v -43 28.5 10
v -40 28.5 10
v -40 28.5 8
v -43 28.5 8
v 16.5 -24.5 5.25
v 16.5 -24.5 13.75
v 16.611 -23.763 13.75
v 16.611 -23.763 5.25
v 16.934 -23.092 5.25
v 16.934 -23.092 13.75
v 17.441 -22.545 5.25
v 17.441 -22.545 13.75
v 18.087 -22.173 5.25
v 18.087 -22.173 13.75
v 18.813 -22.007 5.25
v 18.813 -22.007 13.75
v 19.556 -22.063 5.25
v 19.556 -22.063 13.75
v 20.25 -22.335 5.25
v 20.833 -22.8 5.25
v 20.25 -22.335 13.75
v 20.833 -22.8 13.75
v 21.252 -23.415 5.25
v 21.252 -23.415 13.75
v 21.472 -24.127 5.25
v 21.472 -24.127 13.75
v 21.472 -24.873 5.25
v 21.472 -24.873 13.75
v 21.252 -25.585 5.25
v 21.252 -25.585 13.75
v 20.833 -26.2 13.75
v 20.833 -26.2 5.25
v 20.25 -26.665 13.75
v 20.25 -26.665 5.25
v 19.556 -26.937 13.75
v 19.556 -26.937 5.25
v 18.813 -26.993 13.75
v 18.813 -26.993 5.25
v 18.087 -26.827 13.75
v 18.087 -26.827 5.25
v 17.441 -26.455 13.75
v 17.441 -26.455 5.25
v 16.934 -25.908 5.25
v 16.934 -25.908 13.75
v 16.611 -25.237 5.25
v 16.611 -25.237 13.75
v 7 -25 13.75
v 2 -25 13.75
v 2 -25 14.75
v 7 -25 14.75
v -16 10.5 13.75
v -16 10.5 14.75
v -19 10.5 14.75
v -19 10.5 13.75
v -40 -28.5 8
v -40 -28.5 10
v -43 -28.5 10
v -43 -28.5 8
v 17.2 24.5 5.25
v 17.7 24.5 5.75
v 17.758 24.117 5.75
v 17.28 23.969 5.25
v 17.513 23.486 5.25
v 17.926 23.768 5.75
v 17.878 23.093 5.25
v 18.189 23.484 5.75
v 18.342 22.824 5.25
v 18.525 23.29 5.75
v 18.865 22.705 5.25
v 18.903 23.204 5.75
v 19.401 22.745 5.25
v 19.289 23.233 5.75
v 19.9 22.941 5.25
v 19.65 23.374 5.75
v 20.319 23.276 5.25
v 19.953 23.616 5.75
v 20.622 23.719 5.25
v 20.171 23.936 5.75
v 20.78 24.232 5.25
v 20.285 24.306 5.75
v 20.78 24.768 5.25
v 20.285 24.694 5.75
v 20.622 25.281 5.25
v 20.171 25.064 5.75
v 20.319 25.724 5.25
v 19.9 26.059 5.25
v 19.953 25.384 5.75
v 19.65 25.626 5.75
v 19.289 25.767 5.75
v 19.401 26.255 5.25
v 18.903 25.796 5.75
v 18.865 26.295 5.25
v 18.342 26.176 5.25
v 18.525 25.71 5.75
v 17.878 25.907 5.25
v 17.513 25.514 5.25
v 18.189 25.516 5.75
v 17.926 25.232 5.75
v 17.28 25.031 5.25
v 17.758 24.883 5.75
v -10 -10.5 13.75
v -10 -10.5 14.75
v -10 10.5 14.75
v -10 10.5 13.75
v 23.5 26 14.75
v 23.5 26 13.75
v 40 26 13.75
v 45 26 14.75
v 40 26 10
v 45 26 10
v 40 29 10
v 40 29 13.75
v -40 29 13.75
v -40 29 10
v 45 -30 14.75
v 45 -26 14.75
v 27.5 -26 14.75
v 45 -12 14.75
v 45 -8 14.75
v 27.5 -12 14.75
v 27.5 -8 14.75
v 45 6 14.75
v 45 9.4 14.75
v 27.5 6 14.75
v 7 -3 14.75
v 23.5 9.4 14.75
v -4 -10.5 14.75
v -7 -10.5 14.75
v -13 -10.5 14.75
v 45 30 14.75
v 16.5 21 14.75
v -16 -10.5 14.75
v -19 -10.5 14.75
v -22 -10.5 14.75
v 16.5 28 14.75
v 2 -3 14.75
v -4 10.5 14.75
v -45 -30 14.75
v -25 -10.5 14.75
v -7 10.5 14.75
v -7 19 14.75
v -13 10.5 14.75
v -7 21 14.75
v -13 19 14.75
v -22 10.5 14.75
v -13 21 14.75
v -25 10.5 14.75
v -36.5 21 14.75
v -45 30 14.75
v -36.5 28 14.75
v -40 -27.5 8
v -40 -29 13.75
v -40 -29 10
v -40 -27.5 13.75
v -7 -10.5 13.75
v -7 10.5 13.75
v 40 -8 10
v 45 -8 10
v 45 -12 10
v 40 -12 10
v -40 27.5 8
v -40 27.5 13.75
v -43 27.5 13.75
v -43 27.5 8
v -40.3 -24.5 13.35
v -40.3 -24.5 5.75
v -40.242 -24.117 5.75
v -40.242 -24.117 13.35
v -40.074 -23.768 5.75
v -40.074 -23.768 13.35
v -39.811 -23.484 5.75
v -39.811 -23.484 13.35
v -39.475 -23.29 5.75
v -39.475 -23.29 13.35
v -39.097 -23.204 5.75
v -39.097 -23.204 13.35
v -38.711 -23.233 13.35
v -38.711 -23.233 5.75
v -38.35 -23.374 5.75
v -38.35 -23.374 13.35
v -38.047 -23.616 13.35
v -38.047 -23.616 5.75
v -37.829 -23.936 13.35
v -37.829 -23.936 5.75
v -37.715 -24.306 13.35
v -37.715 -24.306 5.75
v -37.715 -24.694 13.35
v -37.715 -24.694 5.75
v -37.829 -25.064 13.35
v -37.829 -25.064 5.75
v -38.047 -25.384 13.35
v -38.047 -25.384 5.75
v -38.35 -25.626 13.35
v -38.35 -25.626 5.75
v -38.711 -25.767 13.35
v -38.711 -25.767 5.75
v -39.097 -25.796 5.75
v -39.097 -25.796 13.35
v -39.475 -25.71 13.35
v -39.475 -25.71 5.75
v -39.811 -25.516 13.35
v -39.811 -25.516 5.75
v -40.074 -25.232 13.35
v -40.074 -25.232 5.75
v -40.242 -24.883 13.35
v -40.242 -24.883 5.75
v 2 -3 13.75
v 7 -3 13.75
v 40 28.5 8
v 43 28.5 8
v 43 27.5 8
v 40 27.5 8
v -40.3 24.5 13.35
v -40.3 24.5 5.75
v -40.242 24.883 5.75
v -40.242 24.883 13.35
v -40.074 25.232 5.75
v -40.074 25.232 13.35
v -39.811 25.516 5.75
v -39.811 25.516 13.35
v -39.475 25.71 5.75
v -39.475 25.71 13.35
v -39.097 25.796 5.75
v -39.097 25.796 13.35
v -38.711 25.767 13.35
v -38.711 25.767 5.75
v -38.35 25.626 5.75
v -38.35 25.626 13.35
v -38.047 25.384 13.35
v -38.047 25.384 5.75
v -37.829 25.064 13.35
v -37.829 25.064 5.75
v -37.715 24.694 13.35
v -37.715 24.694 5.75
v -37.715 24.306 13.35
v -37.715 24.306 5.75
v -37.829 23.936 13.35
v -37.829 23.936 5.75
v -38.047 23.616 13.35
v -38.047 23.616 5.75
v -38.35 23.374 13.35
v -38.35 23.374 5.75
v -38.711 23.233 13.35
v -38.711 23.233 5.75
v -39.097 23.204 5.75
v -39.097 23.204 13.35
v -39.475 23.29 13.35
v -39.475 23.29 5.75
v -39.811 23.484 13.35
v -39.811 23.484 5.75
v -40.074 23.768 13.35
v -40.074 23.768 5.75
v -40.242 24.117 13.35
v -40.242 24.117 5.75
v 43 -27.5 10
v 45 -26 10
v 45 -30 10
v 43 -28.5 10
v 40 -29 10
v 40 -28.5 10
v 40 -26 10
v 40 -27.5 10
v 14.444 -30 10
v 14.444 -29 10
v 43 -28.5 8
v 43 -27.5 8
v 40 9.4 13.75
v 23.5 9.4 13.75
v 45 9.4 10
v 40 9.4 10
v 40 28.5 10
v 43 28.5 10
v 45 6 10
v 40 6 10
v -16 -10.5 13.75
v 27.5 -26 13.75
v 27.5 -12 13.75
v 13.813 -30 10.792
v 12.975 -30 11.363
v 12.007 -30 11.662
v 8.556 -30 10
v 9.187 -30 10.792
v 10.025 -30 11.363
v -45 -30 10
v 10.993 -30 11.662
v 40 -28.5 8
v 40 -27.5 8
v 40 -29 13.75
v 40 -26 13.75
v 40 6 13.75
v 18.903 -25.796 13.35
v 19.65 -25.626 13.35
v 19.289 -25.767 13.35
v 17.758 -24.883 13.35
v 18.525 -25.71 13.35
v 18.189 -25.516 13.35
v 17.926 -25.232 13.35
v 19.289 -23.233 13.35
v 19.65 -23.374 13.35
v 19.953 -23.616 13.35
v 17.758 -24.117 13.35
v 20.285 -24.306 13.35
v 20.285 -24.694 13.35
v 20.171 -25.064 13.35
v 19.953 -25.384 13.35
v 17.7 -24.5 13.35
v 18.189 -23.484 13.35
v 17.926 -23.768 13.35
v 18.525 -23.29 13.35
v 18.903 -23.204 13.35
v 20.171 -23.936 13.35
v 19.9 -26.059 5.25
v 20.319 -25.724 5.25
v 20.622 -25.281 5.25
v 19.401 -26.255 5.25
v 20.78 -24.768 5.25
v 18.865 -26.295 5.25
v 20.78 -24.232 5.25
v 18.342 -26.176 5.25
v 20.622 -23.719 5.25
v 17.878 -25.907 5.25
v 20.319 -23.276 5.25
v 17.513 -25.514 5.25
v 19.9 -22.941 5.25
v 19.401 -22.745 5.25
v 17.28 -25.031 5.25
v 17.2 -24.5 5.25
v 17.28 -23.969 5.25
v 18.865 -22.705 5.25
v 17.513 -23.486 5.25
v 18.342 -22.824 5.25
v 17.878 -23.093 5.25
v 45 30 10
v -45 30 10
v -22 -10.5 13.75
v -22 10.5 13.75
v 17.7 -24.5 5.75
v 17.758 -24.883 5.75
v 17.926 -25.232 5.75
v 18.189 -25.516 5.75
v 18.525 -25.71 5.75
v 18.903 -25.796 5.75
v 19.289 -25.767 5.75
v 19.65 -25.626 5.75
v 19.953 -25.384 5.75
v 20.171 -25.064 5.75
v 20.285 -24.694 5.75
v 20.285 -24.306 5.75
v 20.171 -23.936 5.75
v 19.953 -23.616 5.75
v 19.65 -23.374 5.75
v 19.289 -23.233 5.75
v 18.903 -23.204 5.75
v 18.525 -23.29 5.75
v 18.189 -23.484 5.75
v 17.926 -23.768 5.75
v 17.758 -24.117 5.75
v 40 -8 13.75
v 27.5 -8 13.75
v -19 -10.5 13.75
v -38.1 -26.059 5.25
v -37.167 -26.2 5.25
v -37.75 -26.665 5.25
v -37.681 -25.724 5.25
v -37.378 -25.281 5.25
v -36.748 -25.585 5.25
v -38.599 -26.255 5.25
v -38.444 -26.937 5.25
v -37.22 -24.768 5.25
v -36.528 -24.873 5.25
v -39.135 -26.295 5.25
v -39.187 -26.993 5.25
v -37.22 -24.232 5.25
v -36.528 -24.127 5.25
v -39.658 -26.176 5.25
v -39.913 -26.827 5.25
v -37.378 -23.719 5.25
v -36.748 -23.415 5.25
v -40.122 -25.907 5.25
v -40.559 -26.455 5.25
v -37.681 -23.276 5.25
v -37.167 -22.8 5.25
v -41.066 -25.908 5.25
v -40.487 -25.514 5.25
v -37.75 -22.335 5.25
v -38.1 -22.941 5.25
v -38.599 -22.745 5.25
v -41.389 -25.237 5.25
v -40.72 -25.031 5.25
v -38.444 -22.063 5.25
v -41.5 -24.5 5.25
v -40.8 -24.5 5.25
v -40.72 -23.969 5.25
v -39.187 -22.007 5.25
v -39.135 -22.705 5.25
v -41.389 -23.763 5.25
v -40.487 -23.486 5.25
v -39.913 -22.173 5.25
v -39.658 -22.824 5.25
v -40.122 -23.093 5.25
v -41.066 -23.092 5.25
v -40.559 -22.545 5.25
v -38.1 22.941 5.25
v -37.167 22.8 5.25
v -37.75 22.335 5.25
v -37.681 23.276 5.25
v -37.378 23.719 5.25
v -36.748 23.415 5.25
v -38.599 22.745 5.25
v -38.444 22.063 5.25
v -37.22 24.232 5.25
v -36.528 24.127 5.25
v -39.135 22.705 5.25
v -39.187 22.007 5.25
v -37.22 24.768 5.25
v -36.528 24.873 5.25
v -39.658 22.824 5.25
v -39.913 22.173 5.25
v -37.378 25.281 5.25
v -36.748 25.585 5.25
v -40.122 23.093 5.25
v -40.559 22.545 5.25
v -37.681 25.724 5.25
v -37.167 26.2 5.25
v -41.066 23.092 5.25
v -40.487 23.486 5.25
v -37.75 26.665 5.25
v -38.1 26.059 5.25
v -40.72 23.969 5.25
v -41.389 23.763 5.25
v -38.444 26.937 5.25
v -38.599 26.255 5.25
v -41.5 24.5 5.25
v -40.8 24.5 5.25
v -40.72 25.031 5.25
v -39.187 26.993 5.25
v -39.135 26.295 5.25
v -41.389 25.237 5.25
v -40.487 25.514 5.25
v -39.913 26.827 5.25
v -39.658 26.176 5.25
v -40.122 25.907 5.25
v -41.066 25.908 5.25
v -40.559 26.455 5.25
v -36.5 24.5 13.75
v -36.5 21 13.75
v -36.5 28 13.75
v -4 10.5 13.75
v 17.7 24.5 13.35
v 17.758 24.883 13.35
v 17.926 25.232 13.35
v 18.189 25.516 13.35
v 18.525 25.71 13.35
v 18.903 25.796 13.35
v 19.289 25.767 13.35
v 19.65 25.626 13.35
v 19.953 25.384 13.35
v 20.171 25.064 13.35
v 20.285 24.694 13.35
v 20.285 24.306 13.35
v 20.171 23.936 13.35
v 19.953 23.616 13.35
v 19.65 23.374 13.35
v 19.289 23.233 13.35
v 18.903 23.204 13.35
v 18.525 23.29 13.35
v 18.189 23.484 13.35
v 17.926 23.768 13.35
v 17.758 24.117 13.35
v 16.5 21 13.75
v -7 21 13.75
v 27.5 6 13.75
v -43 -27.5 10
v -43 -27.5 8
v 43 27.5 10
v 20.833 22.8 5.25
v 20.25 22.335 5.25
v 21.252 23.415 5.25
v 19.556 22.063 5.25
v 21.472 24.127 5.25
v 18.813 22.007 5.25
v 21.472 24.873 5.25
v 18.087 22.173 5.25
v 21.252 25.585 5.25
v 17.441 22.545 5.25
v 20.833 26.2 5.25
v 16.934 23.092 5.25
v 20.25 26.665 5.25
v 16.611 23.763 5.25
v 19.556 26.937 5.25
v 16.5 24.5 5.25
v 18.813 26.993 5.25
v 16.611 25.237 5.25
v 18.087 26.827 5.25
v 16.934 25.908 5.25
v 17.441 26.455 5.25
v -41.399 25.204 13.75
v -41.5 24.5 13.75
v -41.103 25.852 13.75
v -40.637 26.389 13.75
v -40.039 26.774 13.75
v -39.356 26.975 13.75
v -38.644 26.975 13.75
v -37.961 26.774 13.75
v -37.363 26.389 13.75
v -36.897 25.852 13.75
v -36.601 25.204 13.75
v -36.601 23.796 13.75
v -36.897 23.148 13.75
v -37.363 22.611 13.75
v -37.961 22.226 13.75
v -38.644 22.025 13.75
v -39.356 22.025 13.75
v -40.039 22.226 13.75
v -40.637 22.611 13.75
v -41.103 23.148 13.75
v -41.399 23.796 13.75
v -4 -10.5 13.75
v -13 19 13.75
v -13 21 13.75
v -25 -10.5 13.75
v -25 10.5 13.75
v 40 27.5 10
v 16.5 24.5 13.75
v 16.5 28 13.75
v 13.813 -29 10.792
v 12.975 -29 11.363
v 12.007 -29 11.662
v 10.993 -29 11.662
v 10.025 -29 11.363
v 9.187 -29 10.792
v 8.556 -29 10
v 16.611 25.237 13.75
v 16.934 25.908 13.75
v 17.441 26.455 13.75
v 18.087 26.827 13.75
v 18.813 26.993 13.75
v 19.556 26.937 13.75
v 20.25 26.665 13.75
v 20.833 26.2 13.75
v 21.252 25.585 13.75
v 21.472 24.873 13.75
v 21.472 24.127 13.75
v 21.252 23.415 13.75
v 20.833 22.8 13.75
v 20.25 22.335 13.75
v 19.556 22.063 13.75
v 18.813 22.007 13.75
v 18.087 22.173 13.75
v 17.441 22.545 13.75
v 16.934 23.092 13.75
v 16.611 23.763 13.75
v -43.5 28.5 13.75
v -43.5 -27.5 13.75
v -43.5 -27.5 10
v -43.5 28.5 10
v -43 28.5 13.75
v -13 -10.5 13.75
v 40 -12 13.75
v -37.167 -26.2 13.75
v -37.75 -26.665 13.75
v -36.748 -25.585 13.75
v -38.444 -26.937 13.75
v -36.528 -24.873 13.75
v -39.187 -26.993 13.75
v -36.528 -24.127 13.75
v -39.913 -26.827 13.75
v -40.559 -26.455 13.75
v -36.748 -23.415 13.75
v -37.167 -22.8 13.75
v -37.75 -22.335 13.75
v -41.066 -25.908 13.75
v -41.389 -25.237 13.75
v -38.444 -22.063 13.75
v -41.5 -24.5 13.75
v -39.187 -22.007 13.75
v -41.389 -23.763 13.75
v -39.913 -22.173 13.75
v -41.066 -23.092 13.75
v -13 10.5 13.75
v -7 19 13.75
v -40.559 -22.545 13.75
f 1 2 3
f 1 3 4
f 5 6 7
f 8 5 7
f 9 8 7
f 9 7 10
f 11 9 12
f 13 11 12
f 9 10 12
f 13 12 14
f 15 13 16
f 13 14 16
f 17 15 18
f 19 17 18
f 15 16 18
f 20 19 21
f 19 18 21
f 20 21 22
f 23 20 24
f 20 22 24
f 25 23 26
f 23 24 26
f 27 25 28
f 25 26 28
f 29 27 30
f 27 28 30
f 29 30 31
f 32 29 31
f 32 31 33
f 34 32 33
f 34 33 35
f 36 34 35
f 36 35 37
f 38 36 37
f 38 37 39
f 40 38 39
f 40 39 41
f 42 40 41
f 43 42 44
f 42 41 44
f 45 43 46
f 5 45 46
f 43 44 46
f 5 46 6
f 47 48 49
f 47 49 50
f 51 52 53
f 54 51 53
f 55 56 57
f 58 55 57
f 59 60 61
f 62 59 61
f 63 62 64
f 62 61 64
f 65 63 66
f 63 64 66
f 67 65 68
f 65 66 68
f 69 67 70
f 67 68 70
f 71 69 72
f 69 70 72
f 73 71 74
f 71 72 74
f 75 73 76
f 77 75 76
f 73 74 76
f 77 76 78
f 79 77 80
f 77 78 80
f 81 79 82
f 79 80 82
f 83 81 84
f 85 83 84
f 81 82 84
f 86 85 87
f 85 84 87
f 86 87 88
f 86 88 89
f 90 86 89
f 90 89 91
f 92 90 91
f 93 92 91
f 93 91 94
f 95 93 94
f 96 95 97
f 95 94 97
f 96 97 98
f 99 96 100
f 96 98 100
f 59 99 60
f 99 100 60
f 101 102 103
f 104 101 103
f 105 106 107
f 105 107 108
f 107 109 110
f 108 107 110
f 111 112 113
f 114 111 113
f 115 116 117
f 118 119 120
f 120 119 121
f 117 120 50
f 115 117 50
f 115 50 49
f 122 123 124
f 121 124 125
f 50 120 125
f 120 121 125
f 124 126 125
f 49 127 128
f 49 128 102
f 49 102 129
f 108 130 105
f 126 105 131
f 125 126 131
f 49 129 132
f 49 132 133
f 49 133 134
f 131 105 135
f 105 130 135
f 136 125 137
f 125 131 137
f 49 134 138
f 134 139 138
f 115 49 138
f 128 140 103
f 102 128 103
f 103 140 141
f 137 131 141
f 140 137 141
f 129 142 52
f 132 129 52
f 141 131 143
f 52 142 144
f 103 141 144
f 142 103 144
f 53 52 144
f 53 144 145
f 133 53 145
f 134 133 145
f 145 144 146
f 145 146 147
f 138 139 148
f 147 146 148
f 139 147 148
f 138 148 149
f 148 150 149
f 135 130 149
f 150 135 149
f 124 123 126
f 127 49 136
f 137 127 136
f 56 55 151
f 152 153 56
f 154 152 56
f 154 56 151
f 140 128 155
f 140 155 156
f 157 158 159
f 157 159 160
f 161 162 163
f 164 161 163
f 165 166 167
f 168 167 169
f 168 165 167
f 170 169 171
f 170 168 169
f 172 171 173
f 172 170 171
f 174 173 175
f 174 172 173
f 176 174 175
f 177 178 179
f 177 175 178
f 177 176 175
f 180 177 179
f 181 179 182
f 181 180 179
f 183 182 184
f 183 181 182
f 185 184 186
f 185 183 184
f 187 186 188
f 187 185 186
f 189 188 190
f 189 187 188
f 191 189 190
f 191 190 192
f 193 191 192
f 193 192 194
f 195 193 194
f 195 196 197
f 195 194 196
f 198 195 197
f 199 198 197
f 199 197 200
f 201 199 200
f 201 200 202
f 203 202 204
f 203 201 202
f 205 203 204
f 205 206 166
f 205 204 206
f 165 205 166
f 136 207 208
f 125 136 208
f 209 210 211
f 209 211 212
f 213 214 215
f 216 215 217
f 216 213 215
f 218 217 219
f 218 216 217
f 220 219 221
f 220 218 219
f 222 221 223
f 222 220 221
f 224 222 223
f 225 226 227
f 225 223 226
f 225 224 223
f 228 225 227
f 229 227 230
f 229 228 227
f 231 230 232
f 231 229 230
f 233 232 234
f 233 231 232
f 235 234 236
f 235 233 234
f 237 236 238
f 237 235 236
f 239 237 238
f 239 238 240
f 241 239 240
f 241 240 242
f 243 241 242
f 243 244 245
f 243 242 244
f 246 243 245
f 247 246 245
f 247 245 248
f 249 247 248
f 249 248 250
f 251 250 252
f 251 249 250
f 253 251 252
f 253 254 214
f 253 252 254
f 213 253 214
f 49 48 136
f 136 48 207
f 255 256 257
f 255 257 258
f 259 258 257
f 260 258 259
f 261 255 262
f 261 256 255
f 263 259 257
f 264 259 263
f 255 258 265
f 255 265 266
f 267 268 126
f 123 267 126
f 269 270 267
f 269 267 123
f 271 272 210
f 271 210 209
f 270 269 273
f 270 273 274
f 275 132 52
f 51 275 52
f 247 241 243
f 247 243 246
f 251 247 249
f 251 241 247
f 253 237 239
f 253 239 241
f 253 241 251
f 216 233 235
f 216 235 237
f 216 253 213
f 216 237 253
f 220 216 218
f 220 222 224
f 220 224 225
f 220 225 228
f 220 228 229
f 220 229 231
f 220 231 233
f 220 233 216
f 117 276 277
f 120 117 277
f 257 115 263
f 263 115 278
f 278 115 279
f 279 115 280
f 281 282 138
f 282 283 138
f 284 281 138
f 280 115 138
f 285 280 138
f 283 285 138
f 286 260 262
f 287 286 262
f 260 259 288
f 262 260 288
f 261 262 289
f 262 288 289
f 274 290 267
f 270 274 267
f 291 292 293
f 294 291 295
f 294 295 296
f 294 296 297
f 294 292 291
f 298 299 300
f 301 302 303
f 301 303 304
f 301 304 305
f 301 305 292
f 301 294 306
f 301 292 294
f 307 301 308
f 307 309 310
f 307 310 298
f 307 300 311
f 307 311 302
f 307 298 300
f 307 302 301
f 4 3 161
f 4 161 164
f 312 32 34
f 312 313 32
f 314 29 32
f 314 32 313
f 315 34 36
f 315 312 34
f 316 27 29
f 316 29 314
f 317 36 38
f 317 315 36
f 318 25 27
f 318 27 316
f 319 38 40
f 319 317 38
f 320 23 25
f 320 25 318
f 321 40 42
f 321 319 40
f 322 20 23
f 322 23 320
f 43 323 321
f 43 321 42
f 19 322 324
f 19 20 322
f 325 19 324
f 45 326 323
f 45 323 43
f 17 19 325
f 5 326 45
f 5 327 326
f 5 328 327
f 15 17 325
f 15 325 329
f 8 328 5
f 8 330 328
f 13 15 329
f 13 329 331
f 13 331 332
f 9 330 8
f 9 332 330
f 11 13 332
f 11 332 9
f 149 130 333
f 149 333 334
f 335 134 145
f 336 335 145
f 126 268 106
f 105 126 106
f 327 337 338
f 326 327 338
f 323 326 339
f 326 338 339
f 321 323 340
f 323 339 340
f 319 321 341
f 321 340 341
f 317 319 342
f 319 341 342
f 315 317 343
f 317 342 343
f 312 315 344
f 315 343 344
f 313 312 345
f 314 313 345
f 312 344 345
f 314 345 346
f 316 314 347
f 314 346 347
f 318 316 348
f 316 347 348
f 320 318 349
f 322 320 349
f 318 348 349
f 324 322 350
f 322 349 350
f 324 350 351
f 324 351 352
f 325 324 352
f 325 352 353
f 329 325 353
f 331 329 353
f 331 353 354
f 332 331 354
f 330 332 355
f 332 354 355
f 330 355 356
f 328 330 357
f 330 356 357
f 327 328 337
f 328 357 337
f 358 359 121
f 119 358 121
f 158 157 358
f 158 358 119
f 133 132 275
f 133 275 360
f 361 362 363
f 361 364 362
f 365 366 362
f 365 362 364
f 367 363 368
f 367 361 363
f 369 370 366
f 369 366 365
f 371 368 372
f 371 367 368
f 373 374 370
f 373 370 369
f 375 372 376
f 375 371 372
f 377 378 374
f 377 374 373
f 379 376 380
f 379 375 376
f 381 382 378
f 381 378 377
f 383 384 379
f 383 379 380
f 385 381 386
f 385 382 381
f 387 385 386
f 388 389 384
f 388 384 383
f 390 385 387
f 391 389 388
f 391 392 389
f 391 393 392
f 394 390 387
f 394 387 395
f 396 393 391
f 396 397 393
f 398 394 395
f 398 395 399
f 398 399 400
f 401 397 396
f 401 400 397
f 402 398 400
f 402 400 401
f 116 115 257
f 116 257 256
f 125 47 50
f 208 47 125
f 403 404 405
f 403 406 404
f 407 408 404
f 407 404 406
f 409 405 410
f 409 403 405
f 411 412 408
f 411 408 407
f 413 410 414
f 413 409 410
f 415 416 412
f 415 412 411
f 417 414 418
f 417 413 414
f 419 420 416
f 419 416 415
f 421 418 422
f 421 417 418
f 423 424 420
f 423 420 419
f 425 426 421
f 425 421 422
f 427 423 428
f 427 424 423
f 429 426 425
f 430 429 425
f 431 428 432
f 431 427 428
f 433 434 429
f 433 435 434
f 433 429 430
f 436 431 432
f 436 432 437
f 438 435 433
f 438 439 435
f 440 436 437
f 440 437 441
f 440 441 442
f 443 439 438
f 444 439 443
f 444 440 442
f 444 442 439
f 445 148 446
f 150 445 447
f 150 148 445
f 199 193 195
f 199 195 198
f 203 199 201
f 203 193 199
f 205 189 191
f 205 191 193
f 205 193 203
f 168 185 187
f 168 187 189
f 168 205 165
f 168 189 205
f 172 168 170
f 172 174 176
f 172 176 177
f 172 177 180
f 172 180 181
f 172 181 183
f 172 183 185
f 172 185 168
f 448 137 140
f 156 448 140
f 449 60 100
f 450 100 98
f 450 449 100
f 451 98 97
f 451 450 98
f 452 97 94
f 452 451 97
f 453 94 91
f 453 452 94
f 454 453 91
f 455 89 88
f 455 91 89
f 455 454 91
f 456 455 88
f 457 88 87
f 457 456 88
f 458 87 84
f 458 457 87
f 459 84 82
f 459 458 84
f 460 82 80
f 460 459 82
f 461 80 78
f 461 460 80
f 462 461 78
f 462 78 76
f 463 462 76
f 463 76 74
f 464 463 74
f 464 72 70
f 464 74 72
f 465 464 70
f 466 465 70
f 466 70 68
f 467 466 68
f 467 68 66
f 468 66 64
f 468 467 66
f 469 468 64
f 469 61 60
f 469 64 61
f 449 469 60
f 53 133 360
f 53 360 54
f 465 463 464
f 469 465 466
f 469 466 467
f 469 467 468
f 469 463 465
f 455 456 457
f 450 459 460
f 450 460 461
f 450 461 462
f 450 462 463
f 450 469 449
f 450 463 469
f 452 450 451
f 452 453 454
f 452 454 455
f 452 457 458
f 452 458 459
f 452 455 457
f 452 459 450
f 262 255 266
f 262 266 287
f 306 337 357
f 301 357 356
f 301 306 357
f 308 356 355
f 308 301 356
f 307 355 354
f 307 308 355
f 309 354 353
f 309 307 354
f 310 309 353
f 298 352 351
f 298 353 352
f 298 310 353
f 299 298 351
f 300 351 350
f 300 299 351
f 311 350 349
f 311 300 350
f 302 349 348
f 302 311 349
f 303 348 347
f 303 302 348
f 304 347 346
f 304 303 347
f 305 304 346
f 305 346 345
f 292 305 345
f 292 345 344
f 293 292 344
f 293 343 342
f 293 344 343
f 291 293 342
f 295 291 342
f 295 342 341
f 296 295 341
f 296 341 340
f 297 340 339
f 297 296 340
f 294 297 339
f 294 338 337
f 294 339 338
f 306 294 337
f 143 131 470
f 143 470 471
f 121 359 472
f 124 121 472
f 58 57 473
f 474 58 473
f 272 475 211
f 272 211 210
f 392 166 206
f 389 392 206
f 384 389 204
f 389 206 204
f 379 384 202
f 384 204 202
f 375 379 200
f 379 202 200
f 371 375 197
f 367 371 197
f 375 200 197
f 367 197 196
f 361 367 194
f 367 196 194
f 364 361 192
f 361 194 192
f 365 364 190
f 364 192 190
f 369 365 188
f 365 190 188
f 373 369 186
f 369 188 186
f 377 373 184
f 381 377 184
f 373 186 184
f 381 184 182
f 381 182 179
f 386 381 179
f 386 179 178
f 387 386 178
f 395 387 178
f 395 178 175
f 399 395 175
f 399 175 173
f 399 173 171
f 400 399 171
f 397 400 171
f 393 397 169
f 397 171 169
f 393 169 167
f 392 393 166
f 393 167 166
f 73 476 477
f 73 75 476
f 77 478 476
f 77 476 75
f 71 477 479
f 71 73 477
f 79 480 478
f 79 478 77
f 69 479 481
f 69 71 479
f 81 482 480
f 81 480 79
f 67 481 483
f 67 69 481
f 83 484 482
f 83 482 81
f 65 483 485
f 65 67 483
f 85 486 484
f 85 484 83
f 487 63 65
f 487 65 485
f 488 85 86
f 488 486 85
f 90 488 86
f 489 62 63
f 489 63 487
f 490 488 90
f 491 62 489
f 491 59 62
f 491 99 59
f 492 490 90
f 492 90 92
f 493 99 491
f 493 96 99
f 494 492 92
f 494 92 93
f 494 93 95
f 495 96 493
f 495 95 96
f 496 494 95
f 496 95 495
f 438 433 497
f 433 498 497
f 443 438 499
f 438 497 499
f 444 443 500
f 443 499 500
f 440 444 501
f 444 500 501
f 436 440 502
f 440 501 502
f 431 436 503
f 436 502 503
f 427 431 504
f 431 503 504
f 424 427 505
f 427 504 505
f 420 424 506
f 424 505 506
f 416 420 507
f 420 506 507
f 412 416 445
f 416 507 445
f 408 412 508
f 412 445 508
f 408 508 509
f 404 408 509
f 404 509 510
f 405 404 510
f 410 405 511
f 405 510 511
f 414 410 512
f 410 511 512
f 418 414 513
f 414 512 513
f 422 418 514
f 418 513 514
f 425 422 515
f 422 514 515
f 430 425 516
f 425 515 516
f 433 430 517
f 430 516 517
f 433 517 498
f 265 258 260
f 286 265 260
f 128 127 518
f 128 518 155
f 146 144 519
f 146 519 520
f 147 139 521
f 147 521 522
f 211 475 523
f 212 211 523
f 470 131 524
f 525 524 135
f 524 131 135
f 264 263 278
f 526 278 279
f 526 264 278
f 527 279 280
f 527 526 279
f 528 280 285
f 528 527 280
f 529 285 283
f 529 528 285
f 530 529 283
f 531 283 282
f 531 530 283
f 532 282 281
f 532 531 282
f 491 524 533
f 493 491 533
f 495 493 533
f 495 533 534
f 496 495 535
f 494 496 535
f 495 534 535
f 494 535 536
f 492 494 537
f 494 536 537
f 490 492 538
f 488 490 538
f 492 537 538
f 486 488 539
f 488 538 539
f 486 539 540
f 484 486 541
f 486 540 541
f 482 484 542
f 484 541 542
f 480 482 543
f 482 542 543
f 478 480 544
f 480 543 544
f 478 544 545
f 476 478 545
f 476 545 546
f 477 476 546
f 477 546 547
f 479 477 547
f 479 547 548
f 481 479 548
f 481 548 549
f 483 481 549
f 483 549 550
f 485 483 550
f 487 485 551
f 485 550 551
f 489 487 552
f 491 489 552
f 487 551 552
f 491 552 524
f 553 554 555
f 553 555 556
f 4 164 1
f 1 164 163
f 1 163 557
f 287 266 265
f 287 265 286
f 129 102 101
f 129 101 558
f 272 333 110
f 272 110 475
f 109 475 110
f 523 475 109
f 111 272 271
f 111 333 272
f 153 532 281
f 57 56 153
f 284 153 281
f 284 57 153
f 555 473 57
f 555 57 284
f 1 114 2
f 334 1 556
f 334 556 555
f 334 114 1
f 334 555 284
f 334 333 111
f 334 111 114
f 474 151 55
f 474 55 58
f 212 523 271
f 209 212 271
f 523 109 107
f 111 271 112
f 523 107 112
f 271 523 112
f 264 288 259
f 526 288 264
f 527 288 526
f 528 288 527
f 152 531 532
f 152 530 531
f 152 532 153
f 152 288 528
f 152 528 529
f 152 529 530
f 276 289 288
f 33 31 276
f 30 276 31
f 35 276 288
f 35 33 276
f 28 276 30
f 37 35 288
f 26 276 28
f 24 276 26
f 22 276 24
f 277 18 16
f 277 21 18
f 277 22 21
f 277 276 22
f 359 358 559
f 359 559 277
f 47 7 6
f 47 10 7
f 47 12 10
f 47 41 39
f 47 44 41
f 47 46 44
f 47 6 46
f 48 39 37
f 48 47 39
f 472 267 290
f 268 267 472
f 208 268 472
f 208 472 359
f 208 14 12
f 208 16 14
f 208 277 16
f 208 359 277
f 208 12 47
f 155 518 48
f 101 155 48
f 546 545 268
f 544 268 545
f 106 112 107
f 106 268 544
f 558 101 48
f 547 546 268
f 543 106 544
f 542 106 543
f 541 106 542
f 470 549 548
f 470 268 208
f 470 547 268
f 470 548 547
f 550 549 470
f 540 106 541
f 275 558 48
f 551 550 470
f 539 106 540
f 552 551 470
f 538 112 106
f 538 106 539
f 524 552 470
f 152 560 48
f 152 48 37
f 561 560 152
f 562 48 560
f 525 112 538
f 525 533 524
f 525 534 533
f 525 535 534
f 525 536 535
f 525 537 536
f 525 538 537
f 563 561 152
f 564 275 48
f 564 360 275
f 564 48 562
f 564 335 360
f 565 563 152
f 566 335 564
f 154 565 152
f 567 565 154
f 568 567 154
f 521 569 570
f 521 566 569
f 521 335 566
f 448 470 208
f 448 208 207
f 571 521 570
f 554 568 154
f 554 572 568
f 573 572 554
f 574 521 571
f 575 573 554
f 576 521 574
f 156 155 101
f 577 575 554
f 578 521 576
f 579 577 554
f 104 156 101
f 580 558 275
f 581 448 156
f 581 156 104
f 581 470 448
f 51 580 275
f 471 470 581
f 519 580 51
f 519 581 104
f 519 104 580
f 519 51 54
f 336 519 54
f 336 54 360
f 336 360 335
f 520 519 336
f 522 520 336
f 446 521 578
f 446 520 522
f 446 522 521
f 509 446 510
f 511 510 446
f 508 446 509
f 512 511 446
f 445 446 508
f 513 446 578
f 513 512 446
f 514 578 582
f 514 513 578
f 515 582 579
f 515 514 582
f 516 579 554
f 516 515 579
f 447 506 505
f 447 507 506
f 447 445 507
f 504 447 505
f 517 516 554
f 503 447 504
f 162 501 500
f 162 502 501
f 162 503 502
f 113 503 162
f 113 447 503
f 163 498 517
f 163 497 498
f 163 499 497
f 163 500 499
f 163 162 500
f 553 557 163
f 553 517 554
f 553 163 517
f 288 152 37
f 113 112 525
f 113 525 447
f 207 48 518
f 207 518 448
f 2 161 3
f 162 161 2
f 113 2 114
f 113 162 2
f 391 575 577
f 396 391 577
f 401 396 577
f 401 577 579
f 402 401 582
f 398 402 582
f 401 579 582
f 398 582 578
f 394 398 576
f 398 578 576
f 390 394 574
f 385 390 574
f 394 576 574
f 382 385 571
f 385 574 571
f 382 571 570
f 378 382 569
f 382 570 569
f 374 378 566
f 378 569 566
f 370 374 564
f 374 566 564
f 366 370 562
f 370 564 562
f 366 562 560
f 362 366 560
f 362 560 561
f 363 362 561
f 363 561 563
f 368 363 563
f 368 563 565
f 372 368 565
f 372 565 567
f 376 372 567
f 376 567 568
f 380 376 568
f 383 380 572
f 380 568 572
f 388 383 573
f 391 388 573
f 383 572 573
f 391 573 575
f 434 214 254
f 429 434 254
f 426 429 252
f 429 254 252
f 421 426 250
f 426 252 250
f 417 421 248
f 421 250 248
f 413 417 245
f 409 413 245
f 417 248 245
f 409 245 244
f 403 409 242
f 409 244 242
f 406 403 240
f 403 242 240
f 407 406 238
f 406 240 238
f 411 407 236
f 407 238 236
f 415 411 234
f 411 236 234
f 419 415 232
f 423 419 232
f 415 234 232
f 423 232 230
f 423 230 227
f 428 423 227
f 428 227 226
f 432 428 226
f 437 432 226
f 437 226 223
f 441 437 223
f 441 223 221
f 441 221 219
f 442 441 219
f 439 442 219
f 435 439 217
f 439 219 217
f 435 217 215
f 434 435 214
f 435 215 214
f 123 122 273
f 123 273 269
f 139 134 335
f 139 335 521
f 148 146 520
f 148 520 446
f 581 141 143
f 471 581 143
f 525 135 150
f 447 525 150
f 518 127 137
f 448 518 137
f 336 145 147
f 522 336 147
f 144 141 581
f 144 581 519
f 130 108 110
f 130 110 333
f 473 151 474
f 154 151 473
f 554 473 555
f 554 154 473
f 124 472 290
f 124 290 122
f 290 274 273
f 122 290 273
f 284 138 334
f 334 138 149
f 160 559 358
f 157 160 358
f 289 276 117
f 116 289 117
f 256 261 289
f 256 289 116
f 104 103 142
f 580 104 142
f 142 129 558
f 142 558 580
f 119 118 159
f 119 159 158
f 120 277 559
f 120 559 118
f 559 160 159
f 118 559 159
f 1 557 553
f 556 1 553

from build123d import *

# Parameters (mm, degrees)
BOX071_W               = 5
BOX071_H               = 22
BOX071_DEPTH           = 10
BOX002_W               = 5
BOX002_H               = 12
BOX002_DEPTH           = 6
BOX003_W               = 9
BOX003_H               = 10
BOX003_DEPTH           = 3.8
FILLET_R               = 1.6
BOX004_W               = 7
BOX004_H               = 10
BOX004_DEPTH           = 3.8
FILLET001_R            = 0.6
BOX005_W               = 7
BOX005_H               = 10
BOX005_DEPTH           = 3.8
FILLET002_R            = 0.6
CYLINDER008_R          = 3.4
CYLINDER008_DEPTH      = 10
BOX006_W               = 26
BOX006_H               = 16.6
BOX006_DEPTH           = 14
BOX007_W               = 22
BOX007_H               = 14
BOX007_DEPTH           = 16.6
BOX008_W               = 22
BOX008_H               = 14
BOX008_DEPTH           = 16.6
CYLINDER001_R          = 1.6
CYLINDER001_DEPTH      = 10
CYLINDER_R             = 1.6
CYLINDER_DEPTH         = 10
CYLINDER002_R          = 1.6
CYLINDER002_DEPTH      = 10
CYLINDER003_R          = 1.6
CYLINDER003_DEPTH      = 10
BOX017_W               = 3
BOX017_H               = 21
BOX017_DEPTH           = 3
BOX009_W               = 3
BOX009_H               = 21
BOX009_DEPTH           = 3
BOX016_W               = 3
BOX016_H               = 21
BOX016_DEPTH           = 3
BOX010_W               = 3
BOX010_H               = 21
BOX010_DEPTH           = 3
BOX021_W               = 53
BOX021_H               = 7
BOX021_DEPTH           = 10
BOX014_W               = 6
BOX014_H               = 2
BOX014_DEPTH           = 10
CYLINDER013_R          = 1.3
CYLINDER013_DEPTH      = 8.5
CYLINDER015_R          = 1.3
CYLINDER015_DEPTH      = 8.5
CYLINDER016_R          = 1.3
CYLINDER016_DEPTH      = 8.5
CYLINDER012_R          = 1.3
CYLINDER012_DEPTH      = 8.5
BOX018_W               = 3
BOX018_H               = 1
BOX018_DEPTH           = 6.75
BOX012_W               = 3
BOX012_H               = 1
BOX012_DEPTH           = 6.75
BOX013_W               = 3
BOX013_H               = 1
BOX013_DEPTH           = 6.75
BOX015_W               = 3
BOX015_H               = 1
BOX015_DEPTH           = 6.75
CYLINDER014_R          = 2.5
CYLINDER014_DEPTH      = 8.5
CYLINDER009_R          = 2.5
CYLINDER009_DEPTH      = 8.5
CYLINDER010_R          = 2.5
CYLINDER010_DEPTH      = 8.5
CYLINDER011_R          = 2.5
CYLINDER011_DEPTH      = 8.5
BOX020_W               = 3.5
BOX020_H               = 56
BOX020_DEPTH           = 10
BOX011_W               = 80
BOX011_H               = 58
BOX011_DEPTH           = 10
BOX019_W               = 90
BOX019_H               = 60
BOX019_DEPTH           = 4.75
CUT003_PLACEMENT_ANGLE = 180
CHAMFER004_SIZE        = 0.5


with BuildPart() as w_rfel045:
    # Box071 → Box071 (new body)
    with BuildSketch(Plane(origin=(2, -25, 7), x_dir=(1, 0, 0), z_dir=(0, 0, 1))):
        with Locations((2.5, 11)):
            Rectangle(BOX071_W, BOX071_H)
    extrude(amount=BOX071_DEPTH)


with BuildPart() as sd_slot:
    # Box002 → Box002 (new body)
    with BuildSketch(Plane(origin=(-45, -6, -1), x_dir=(1, 0, 0), z_dir=(0, 0, 1))):
        with Locations((2.5, 6)):
            Rectangle(BOX002_W, BOX002_H)
    extrude(amount=BOX002_DEPTH)


with BuildPart() as usb_c:
    # Box003 → Box003 (new body)
    with BuildSketch(Plane(origin=(-35.8, -29, 4.7), x_dir=(1, 0, 0), z_dir=(0, 0, 1))):
        with Locations((4.5, 5)):
            Rectangle(BOX003_W, BOX003_H)
    extrude(amount=BOX003_DEPTH)

    # Fillet
    fillet_edges = [usb_c.edges().sort_by_distance(p)[0] for p in [
        (-35.8, -24, 8.5),
        (-35.8, -24, 4.7),
        (-26.8, -24, 8.5),
        (-26.8, -24, 4.7),
    ]]
    fillet(fillet_edges, radius=FILLET_R)


with BuildPart() as usb_c_1:
    # Fillet placement: moved
    add(usb_c.part.moved(Location((0, -4, 0))))


with BuildPart() as fillet001:
    # Box004 → Box004 (new body)
    with BuildSketch(Plane(origin=(-20, -29, 4.7), x_dir=(1, 0, 0), z_dir=(0, 0, 1))):
        with Locations((3.5, 5)):
            Rectangle(BOX004_W, BOX004_H)
    extrude(amount=BOX004_DEPTH)

    # Fillet001
    fillet001_edges = [fillet001.edges().sort_by_distance(p)[0] for p in [
        (-20, -24, 8.5),
        (-20, -24, 4.7),
        (-13, -24, 8.5),
        (-13, -24, 4.7),
    ]]
    fillet(fillet001_edges, radius=FILLET001_R)


with BuildPart() as fillet001_1:
    # Fillet001 placement: moved
    add(fillet001.part.moved(Location((0, -4, 0))))


with BuildPart() as fillet002:
    # Box005 → Box005 (new body)
    with BuildSketch(Plane(origin=(-20, -29, 4.7), x_dir=(1, 0, 0), z_dir=(0, 0, 1))):
        with Locations((3.5, 5)):
            Rectangle(BOX005_W, BOX005_H)
    extrude(amount=BOX005_DEPTH)

    # Fillet002
    fillet002_edges = [fillet002.edges().sort_by_distance(p)[0] for p in [
        (-20, -24, 8.5),
        (-20, -24, 4.7),
        (-13, -24, 8.5),
        (-13, -24, 4.7),
    ]]
    fillet(fillet002_edges, radius=FILLET002_R)


with BuildPart() as fillet002_1:
    # Fillet002 placement: moved
    add(fillet002.part.moved(Location((13.5, -4, 0))))


with BuildPart() as audio:
    # Cylinder008 → Cylinder008 (new body)
    with BuildSketch(Plane(origin=(11.5, -23, 8), x_dir=(1, 0, 0), z_dir=(0, -1, 0))):
        Circle(CYLINDER008_R)
    extrude(amount=CYLINDER008_DEPTH)


with BuildPart() as network:
    # Box006 → Box006 (new body)
    with BuildSketch(Plane(origin=(23.5, 9.4, 4.8), x_dir=(1, 0, 0), z_dir=(0, 0, 1))):
        with Locations((13, 8.3)):
            Rectangle(BOX006_W, BOX006_H)
    extrude(amount=BOX006_DEPTH)


with BuildPart() as usb1:
    # Box007 → Box007 (new body)
    with BuildSketch(Plane(origin=(27.5, -8, 4.8), x_dir=(1, 0, 0), z_dir=(0, 0, 1))):
        with Locations((11, 7)):
            Rectangle(BOX007_W, BOX007_H)
    extrude(amount=BOX007_DEPTH)


with BuildPart() as usb2:
    # Box008 → Box008 (new body)
    with BuildSketch(Plane(origin=(27.5, -26, 4.8), x_dir=(1, 0, 0), z_dir=(0, 0, 1))):
        with Locations((11, 7)):
            Rectangle(BOX008_W, BOX008_H)
    extrude(amount=BOX008_DEPTH)


with BuildPart() as zylinder001:
    # Cylinder001 → Cylinder001 (new body)
    with BuildSketch(Plane(origin=(19, 24.5, 0), x_dir=(1, 0, 0), z_dir=(0, 0, 1))):
        Circle(CYLINDER001_R)
    extrude(amount=CYLINDER001_DEPTH)


with BuildPart() as fusion:
    # Cylinder → Cylinder (new body)
    with BuildSketch(Plane(origin=(19, -24.5, 0), x_dir=(1, 0, 0), z_dir=(0, 0, 1))):
        Circle(CYLINDER_R)
    extrude(amount=CYLINDER_DEPTH)

    # Fusion: union Zylinder001
    add(zylinder001.part)


with BuildPart() as zylinder002:
    # Cylinder002 → Cylinder002 (new body)
    with BuildSketch(Plane(origin=(19, 24.5, 0), x_dir=(1, 0, 0), z_dir=(0, 0, 1))):
        Circle(CYLINDER002_R)
    extrude(amount=CYLINDER002_DEPTH)


with BuildPart() as aussparungen:
    # Cylinder003 → Cylinder003 (new body)
    with BuildSketch(Plane(origin=(19, -24.5, 0), x_dir=(1, 0, 0), z_dir=(0, 0, 1))):
        Circle(CYLINDER003_R)
    extrude(amount=CYLINDER003_DEPTH)

    # Fusion001: union Zylinder002
    add(zylinder002.part)


with BuildPart() as aussparungen_1:
    # Fusion001 placement: moved
    add(aussparungen.part.moved(Location((-58, 0, 0))))

    # Fusion002: union Fusion
    add(fusion.part)


with BuildPart() as aussparungen_2:
    # Fusion002 placement: moved
    add(aussparungen_1.part.moved(Location((0, 0, -5.3))))

    # Fusion006: union SD-Slot, USB-C, Fillet001, Fillet002, Audio, Network, USB1, USB2
    add(sd_slot.part)
    add(usb_c_1.part)
    add(fillet001_1.part)
    add(fillet002_1.part)
    add(audio.part)
    add(network.part)
    add(usb1.part)
    add(usb2.part)


with BuildPart() as aussparungen_3:
    # Fusion006 placement: moved
    add(aussparungen_2.part.moved(Location((0, 0, 0.3))))


with BuildPart() as w_rfel011:
    # Box017 → Box017 (new body)
    with BuildSketch(Plane(origin=(16, -10.5, 0), x_dir=(1, 0, 0), z_dir=(0, 0, 1))):
        with Locations((1.5, 10.5)):
            Rectangle(BOX017_W, BOX017_H)
    extrude(amount=BOX017_DEPTH)


with BuildPart() as w_rfel003:
    # Box009 → Box009 (new body)
    with BuildSketch(Plane(origin=(4, -10.5, 0), x_dir=(1, 0, 0), z_dir=(0, 0, 1))):
        with Locations((1.5, 10.5)):
            Rectangle(BOX009_W, BOX009_H)
    extrude(amount=BOX009_DEPTH)


with BuildPart() as w_rfel010:
    # Box016 → Box016 (new body)
    with BuildSketch(Plane(origin=(22, -10.5, 0), x_dir=(1, 0, 0), z_dir=(0, 0, 1))):
        with Locations((1.5, 10.5)):
            Rectangle(BOX016_W, BOX016_H)
    extrude(amount=BOX016_DEPTH)


with BuildPart() as lueftung:
    # Box010 → Box010 (new body)
    with BuildSketch(Plane(origin=(10, -10.5, 0), x_dir=(1, 0, 0), z_dir=(0, 0, 1))):
        with Locations((1.5, 10.5)):
            Rectangle(BOX010_W, BOX010_H)
    extrude(amount=BOX010_DEPTH)

    # Fusion010: union Würfel011, Würfel003, Würfel010
    add(w_rfel011.part)
    add(w_rfel003.part)
    add(w_rfel010.part)


with BuildPart() as w_rfel012:
    # Box021 → Box021 (new body)
    with BuildSketch(Plane(origin=(-16.5, 21, 0), x_dir=(1, 0, 0), z_dir=(0, 0, 1))):
        with Locations((26.5, 3.5)):
            Rectangle(BOX021_W, BOX021_H)
    extrude(amount=BOX021_DEPTH)


with BuildPart() as gpio_leiste:
    # Box014 → Box014 (new body)
    with BuildSketch(Plane(origin=(7, 19, 0), x_dir=(1, 0, 0), z_dir=(0, 0, 1))):
        with Locations((3, 1)):
            Rectangle(BOX014_W, BOX014_H)
    extrude(amount=BOX014_DEPTH)

    # Fusion011: union Würfel012
    add(w_rfel012.part)


with BuildPart() as zylinder012:
    # Cylinder013 → Cylinder013 (new body)
    with BuildSketch(Plane(origin=(39, 24.5, 1), x_dir=(1, 0, 0), z_dir=(0, 0, 1))):
        Circle(CYLINDER013_R)
    extrude(amount=CYLINDER013_DEPTH)


with BuildPart() as zylinder014:
    # Cylinder015 → Cylinder015 (new body)
    with BuildSketch(Plane(origin=(-19, -24.5, 1), x_dir=(1, 0, 0), z_dir=(0, 0, 1))):
        Circle(CYLINDER015_R)
    extrude(amount=CYLINDER015_DEPTH)


with BuildPart() as zylinder015:
    # Cylinder016 → Cylinder016 (new body)
    with BuildSketch(Plane(origin=(39, -24.5, 1), x_dir=(1, 0, 0), z_dir=(0, 0, 1))):
        Circle(CYLINDER016_R)
    extrude(amount=CYLINDER016_DEPTH)


with BuildPart() as fusion014:
    # Cylinder012 → Cylinder012 (new body)
    with BuildSketch(Plane(origin=(-19, 24.5, 1), x_dir=(1, 0, 0), z_dir=(0, 0, 1))):
        Circle(CYLINDER012_R)
    extrude(amount=CYLINDER012_DEPTH)

    # Fusion009: union Zylinder012, Zylinder014, Zylinder015
    add(zylinder012.part)
    add(zylinder014.part)
    add(zylinder015.part)


with BuildPart() as fusion014_1:
    # Fusion009 placement: moved
    add(fusion014.part.moved(Location((0, 0, 0.4))))

    # Fusion014: union Lueftung, GPIO-Leiste
    add(lueftung.part)
    add(gpio_leiste.part)


with BuildPart() as w_rfel005:
    # Box018 → Box018 (new body)
    with BuildSketch(Plane(origin=(40, 27.5, 0), x_dir=(1, 0, 0), z_dir=(0, 0, 1))):
        with Locations((1.5, 0.5)):
            Rectangle(BOX018_W, BOX018_H)
    extrude(amount=BOX018_DEPTH)


with BuildPart() as w_rfel006:
    # Box012 → Box012 (new body)
    with BuildSketch(Plane(origin=(-43, 27.5, 0), x_dir=(1, 0, 0), z_dir=(0, 0, 1))):
        with Locations((1.5, 0.5)):
            Rectangle(BOX012_W, BOX012_H)
    extrude(amount=BOX012_DEPTH)


with BuildPart() as w_rfel007:
    # Box013 → Box013 (new body)
    with BuildSketch(Plane(origin=(40, -28.5, 0), x_dir=(1, 0, 0), z_dir=(0, 0, 1))):
        with Locations((1.5, 0.5)):
            Rectangle(BOX013_W, BOX013_H)
    extrude(amount=BOX013_DEPTH)


with BuildPart() as zentrierung:
    # Box015 → Box015 (new body)
    with BuildSketch(Plane(origin=(-43, -28.5, 0), x_dir=(1, 0, 0), z_dir=(0, 0, 1))):
        with Locations((1.5, 0.5)):
            Rectangle(BOX015_W, BOX015_H)
    extrude(amount=BOX015_DEPTH)

    # Fusion012: union Würfel005, Würfel006, Würfel007
    add(w_rfel005.part)
    add(w_rfel006.part)
    add(w_rfel007.part)


with BuildPart() as zylinder013:
    # Cylinder014 → Cylinder014 (new body)
    with BuildSketch(Plane(origin=(39, 24.5, 1), x_dir=(1, 0, 0), z_dir=(0, 0, 1))):
        Circle(CYLINDER014_R)
    extrude(amount=CYLINDER014_DEPTH)


with BuildPart() as zylinder008:
    # Cylinder009 → Cylinder009 (new body)
    with BuildSketch(Plane(origin=(-19, -24.5, 1), x_dir=(1, 0, 0), z_dir=(0, 0, 1))):
        Circle(CYLINDER009_R)
    extrude(amount=CYLINDER009_DEPTH)


with BuildPart() as zylinder009:
    # Cylinder010 → Cylinder010 (new body)
    with BuildSketch(Plane(origin=(39, -24.5, 1), x_dir=(1, 0, 0), z_dir=(0, 0, 1))):
        Circle(CYLINDER010_R)
    extrude(amount=CYLINDER010_DEPTH)


with BuildPart() as stuetzen:
    # Cylinder011 → Cylinder011 (new body)
    with BuildSketch(Plane(origin=(-19, 24.5, 1), x_dir=(1, 0, 0), z_dir=(0, 0, 1))):
        Circle(CYLINDER011_R)
    extrude(amount=CYLINDER011_DEPTH)

    # Fusion008: union Zylinder013, Zylinder008, Zylinder009
    add(zylinder013.part)
    add(zylinder008.part)
    add(zylinder009.part)


with BuildPart() as deckel_innen_b:
    # Box020 → Box020 (new body)
    with BuildSketch(Plane(origin=(40, -27.5, 1), x_dir=(1, 0, 0), z_dir=(0, 0, 1))):
        with Locations((1.75, 28)):
            Rectangle(BOX020_W, BOX020_H)
    extrude(amount=BOX020_DEPTH)


with BuildPart() as deckel_innen:
    # Box011 → Box011 (new body)
    with BuildSketch(Plane(origin=(-40, -29, 1), x_dir=(1, 0, 0), z_dir=(0, 0, 1))):
        with Locations((40, 29)):
            Rectangle(BOX011_W, BOX011_H)
    extrude(amount=BOX011_DEPTH)

    # Fusion015: union Deckel innen b
    add(deckel_innen_b.part)


with BuildPart() as tx_pi_deckel_mit_ribbon_slot:
    # Box019 → Box019 (new body)
    with BuildSketch(Plane(origin=(-45, -30, 0), x_dir=(1, 0, 0), z_dir=(0, 0, 1))):
        with Locations((45, 30)):
            Rectangle(BOX019_W, BOX019_H)
    extrude(amount=BOX019_DEPTH)

    # Cut002: cut Deckel innen
    add(deckel_innen.part, mode=Mode.SUBTRACT)

    # Fusion013: union Zentrierung, Stuetzen
    add(zentrierung.part)
    add(stuetzen.part)

    # Cut003: cut Fusion014
    add(fusion014_1.part, mode=Mode.SUBTRACT)


with BuildPart() as tx_pi_deckel_mit_ribbon_slot_1:
    # Cut003 placement: moved
    add(tx_pi_deckel_mit_ribbon_slot.part.moved(Location((0, 0, 14.75))).rotate(Axis((0, 0, 14.75), (0, 1, 0)), CUT003_PLACEMENT_ANGLE))

    # Cut004: cut Aussparungen
    add(aussparungen_3.part, mode=Mode.SUBTRACT)

    # Chamfer004
    chamfer004_edges = [tx_pi_deckel_mit_ribbon_slot_1.edges().sort_by_distance(p)[0] for p in [
        (-37.7, 24.5, 5.25),
        (-37.7, -24.5, 5.25),
        (20.3, -24.5, 5.25),
        (20.3, 24.5, 5.25),
    ]]
    chamfer(chamfer004_edges, length=CHAMFER004_SIZE)

    # Cut027: cut Würfel045
    add(w_rfel045.part, mode=Mode.SUBTRACT)


solid = tx_pi_deckel_mit_ribbon_slot_1.part
